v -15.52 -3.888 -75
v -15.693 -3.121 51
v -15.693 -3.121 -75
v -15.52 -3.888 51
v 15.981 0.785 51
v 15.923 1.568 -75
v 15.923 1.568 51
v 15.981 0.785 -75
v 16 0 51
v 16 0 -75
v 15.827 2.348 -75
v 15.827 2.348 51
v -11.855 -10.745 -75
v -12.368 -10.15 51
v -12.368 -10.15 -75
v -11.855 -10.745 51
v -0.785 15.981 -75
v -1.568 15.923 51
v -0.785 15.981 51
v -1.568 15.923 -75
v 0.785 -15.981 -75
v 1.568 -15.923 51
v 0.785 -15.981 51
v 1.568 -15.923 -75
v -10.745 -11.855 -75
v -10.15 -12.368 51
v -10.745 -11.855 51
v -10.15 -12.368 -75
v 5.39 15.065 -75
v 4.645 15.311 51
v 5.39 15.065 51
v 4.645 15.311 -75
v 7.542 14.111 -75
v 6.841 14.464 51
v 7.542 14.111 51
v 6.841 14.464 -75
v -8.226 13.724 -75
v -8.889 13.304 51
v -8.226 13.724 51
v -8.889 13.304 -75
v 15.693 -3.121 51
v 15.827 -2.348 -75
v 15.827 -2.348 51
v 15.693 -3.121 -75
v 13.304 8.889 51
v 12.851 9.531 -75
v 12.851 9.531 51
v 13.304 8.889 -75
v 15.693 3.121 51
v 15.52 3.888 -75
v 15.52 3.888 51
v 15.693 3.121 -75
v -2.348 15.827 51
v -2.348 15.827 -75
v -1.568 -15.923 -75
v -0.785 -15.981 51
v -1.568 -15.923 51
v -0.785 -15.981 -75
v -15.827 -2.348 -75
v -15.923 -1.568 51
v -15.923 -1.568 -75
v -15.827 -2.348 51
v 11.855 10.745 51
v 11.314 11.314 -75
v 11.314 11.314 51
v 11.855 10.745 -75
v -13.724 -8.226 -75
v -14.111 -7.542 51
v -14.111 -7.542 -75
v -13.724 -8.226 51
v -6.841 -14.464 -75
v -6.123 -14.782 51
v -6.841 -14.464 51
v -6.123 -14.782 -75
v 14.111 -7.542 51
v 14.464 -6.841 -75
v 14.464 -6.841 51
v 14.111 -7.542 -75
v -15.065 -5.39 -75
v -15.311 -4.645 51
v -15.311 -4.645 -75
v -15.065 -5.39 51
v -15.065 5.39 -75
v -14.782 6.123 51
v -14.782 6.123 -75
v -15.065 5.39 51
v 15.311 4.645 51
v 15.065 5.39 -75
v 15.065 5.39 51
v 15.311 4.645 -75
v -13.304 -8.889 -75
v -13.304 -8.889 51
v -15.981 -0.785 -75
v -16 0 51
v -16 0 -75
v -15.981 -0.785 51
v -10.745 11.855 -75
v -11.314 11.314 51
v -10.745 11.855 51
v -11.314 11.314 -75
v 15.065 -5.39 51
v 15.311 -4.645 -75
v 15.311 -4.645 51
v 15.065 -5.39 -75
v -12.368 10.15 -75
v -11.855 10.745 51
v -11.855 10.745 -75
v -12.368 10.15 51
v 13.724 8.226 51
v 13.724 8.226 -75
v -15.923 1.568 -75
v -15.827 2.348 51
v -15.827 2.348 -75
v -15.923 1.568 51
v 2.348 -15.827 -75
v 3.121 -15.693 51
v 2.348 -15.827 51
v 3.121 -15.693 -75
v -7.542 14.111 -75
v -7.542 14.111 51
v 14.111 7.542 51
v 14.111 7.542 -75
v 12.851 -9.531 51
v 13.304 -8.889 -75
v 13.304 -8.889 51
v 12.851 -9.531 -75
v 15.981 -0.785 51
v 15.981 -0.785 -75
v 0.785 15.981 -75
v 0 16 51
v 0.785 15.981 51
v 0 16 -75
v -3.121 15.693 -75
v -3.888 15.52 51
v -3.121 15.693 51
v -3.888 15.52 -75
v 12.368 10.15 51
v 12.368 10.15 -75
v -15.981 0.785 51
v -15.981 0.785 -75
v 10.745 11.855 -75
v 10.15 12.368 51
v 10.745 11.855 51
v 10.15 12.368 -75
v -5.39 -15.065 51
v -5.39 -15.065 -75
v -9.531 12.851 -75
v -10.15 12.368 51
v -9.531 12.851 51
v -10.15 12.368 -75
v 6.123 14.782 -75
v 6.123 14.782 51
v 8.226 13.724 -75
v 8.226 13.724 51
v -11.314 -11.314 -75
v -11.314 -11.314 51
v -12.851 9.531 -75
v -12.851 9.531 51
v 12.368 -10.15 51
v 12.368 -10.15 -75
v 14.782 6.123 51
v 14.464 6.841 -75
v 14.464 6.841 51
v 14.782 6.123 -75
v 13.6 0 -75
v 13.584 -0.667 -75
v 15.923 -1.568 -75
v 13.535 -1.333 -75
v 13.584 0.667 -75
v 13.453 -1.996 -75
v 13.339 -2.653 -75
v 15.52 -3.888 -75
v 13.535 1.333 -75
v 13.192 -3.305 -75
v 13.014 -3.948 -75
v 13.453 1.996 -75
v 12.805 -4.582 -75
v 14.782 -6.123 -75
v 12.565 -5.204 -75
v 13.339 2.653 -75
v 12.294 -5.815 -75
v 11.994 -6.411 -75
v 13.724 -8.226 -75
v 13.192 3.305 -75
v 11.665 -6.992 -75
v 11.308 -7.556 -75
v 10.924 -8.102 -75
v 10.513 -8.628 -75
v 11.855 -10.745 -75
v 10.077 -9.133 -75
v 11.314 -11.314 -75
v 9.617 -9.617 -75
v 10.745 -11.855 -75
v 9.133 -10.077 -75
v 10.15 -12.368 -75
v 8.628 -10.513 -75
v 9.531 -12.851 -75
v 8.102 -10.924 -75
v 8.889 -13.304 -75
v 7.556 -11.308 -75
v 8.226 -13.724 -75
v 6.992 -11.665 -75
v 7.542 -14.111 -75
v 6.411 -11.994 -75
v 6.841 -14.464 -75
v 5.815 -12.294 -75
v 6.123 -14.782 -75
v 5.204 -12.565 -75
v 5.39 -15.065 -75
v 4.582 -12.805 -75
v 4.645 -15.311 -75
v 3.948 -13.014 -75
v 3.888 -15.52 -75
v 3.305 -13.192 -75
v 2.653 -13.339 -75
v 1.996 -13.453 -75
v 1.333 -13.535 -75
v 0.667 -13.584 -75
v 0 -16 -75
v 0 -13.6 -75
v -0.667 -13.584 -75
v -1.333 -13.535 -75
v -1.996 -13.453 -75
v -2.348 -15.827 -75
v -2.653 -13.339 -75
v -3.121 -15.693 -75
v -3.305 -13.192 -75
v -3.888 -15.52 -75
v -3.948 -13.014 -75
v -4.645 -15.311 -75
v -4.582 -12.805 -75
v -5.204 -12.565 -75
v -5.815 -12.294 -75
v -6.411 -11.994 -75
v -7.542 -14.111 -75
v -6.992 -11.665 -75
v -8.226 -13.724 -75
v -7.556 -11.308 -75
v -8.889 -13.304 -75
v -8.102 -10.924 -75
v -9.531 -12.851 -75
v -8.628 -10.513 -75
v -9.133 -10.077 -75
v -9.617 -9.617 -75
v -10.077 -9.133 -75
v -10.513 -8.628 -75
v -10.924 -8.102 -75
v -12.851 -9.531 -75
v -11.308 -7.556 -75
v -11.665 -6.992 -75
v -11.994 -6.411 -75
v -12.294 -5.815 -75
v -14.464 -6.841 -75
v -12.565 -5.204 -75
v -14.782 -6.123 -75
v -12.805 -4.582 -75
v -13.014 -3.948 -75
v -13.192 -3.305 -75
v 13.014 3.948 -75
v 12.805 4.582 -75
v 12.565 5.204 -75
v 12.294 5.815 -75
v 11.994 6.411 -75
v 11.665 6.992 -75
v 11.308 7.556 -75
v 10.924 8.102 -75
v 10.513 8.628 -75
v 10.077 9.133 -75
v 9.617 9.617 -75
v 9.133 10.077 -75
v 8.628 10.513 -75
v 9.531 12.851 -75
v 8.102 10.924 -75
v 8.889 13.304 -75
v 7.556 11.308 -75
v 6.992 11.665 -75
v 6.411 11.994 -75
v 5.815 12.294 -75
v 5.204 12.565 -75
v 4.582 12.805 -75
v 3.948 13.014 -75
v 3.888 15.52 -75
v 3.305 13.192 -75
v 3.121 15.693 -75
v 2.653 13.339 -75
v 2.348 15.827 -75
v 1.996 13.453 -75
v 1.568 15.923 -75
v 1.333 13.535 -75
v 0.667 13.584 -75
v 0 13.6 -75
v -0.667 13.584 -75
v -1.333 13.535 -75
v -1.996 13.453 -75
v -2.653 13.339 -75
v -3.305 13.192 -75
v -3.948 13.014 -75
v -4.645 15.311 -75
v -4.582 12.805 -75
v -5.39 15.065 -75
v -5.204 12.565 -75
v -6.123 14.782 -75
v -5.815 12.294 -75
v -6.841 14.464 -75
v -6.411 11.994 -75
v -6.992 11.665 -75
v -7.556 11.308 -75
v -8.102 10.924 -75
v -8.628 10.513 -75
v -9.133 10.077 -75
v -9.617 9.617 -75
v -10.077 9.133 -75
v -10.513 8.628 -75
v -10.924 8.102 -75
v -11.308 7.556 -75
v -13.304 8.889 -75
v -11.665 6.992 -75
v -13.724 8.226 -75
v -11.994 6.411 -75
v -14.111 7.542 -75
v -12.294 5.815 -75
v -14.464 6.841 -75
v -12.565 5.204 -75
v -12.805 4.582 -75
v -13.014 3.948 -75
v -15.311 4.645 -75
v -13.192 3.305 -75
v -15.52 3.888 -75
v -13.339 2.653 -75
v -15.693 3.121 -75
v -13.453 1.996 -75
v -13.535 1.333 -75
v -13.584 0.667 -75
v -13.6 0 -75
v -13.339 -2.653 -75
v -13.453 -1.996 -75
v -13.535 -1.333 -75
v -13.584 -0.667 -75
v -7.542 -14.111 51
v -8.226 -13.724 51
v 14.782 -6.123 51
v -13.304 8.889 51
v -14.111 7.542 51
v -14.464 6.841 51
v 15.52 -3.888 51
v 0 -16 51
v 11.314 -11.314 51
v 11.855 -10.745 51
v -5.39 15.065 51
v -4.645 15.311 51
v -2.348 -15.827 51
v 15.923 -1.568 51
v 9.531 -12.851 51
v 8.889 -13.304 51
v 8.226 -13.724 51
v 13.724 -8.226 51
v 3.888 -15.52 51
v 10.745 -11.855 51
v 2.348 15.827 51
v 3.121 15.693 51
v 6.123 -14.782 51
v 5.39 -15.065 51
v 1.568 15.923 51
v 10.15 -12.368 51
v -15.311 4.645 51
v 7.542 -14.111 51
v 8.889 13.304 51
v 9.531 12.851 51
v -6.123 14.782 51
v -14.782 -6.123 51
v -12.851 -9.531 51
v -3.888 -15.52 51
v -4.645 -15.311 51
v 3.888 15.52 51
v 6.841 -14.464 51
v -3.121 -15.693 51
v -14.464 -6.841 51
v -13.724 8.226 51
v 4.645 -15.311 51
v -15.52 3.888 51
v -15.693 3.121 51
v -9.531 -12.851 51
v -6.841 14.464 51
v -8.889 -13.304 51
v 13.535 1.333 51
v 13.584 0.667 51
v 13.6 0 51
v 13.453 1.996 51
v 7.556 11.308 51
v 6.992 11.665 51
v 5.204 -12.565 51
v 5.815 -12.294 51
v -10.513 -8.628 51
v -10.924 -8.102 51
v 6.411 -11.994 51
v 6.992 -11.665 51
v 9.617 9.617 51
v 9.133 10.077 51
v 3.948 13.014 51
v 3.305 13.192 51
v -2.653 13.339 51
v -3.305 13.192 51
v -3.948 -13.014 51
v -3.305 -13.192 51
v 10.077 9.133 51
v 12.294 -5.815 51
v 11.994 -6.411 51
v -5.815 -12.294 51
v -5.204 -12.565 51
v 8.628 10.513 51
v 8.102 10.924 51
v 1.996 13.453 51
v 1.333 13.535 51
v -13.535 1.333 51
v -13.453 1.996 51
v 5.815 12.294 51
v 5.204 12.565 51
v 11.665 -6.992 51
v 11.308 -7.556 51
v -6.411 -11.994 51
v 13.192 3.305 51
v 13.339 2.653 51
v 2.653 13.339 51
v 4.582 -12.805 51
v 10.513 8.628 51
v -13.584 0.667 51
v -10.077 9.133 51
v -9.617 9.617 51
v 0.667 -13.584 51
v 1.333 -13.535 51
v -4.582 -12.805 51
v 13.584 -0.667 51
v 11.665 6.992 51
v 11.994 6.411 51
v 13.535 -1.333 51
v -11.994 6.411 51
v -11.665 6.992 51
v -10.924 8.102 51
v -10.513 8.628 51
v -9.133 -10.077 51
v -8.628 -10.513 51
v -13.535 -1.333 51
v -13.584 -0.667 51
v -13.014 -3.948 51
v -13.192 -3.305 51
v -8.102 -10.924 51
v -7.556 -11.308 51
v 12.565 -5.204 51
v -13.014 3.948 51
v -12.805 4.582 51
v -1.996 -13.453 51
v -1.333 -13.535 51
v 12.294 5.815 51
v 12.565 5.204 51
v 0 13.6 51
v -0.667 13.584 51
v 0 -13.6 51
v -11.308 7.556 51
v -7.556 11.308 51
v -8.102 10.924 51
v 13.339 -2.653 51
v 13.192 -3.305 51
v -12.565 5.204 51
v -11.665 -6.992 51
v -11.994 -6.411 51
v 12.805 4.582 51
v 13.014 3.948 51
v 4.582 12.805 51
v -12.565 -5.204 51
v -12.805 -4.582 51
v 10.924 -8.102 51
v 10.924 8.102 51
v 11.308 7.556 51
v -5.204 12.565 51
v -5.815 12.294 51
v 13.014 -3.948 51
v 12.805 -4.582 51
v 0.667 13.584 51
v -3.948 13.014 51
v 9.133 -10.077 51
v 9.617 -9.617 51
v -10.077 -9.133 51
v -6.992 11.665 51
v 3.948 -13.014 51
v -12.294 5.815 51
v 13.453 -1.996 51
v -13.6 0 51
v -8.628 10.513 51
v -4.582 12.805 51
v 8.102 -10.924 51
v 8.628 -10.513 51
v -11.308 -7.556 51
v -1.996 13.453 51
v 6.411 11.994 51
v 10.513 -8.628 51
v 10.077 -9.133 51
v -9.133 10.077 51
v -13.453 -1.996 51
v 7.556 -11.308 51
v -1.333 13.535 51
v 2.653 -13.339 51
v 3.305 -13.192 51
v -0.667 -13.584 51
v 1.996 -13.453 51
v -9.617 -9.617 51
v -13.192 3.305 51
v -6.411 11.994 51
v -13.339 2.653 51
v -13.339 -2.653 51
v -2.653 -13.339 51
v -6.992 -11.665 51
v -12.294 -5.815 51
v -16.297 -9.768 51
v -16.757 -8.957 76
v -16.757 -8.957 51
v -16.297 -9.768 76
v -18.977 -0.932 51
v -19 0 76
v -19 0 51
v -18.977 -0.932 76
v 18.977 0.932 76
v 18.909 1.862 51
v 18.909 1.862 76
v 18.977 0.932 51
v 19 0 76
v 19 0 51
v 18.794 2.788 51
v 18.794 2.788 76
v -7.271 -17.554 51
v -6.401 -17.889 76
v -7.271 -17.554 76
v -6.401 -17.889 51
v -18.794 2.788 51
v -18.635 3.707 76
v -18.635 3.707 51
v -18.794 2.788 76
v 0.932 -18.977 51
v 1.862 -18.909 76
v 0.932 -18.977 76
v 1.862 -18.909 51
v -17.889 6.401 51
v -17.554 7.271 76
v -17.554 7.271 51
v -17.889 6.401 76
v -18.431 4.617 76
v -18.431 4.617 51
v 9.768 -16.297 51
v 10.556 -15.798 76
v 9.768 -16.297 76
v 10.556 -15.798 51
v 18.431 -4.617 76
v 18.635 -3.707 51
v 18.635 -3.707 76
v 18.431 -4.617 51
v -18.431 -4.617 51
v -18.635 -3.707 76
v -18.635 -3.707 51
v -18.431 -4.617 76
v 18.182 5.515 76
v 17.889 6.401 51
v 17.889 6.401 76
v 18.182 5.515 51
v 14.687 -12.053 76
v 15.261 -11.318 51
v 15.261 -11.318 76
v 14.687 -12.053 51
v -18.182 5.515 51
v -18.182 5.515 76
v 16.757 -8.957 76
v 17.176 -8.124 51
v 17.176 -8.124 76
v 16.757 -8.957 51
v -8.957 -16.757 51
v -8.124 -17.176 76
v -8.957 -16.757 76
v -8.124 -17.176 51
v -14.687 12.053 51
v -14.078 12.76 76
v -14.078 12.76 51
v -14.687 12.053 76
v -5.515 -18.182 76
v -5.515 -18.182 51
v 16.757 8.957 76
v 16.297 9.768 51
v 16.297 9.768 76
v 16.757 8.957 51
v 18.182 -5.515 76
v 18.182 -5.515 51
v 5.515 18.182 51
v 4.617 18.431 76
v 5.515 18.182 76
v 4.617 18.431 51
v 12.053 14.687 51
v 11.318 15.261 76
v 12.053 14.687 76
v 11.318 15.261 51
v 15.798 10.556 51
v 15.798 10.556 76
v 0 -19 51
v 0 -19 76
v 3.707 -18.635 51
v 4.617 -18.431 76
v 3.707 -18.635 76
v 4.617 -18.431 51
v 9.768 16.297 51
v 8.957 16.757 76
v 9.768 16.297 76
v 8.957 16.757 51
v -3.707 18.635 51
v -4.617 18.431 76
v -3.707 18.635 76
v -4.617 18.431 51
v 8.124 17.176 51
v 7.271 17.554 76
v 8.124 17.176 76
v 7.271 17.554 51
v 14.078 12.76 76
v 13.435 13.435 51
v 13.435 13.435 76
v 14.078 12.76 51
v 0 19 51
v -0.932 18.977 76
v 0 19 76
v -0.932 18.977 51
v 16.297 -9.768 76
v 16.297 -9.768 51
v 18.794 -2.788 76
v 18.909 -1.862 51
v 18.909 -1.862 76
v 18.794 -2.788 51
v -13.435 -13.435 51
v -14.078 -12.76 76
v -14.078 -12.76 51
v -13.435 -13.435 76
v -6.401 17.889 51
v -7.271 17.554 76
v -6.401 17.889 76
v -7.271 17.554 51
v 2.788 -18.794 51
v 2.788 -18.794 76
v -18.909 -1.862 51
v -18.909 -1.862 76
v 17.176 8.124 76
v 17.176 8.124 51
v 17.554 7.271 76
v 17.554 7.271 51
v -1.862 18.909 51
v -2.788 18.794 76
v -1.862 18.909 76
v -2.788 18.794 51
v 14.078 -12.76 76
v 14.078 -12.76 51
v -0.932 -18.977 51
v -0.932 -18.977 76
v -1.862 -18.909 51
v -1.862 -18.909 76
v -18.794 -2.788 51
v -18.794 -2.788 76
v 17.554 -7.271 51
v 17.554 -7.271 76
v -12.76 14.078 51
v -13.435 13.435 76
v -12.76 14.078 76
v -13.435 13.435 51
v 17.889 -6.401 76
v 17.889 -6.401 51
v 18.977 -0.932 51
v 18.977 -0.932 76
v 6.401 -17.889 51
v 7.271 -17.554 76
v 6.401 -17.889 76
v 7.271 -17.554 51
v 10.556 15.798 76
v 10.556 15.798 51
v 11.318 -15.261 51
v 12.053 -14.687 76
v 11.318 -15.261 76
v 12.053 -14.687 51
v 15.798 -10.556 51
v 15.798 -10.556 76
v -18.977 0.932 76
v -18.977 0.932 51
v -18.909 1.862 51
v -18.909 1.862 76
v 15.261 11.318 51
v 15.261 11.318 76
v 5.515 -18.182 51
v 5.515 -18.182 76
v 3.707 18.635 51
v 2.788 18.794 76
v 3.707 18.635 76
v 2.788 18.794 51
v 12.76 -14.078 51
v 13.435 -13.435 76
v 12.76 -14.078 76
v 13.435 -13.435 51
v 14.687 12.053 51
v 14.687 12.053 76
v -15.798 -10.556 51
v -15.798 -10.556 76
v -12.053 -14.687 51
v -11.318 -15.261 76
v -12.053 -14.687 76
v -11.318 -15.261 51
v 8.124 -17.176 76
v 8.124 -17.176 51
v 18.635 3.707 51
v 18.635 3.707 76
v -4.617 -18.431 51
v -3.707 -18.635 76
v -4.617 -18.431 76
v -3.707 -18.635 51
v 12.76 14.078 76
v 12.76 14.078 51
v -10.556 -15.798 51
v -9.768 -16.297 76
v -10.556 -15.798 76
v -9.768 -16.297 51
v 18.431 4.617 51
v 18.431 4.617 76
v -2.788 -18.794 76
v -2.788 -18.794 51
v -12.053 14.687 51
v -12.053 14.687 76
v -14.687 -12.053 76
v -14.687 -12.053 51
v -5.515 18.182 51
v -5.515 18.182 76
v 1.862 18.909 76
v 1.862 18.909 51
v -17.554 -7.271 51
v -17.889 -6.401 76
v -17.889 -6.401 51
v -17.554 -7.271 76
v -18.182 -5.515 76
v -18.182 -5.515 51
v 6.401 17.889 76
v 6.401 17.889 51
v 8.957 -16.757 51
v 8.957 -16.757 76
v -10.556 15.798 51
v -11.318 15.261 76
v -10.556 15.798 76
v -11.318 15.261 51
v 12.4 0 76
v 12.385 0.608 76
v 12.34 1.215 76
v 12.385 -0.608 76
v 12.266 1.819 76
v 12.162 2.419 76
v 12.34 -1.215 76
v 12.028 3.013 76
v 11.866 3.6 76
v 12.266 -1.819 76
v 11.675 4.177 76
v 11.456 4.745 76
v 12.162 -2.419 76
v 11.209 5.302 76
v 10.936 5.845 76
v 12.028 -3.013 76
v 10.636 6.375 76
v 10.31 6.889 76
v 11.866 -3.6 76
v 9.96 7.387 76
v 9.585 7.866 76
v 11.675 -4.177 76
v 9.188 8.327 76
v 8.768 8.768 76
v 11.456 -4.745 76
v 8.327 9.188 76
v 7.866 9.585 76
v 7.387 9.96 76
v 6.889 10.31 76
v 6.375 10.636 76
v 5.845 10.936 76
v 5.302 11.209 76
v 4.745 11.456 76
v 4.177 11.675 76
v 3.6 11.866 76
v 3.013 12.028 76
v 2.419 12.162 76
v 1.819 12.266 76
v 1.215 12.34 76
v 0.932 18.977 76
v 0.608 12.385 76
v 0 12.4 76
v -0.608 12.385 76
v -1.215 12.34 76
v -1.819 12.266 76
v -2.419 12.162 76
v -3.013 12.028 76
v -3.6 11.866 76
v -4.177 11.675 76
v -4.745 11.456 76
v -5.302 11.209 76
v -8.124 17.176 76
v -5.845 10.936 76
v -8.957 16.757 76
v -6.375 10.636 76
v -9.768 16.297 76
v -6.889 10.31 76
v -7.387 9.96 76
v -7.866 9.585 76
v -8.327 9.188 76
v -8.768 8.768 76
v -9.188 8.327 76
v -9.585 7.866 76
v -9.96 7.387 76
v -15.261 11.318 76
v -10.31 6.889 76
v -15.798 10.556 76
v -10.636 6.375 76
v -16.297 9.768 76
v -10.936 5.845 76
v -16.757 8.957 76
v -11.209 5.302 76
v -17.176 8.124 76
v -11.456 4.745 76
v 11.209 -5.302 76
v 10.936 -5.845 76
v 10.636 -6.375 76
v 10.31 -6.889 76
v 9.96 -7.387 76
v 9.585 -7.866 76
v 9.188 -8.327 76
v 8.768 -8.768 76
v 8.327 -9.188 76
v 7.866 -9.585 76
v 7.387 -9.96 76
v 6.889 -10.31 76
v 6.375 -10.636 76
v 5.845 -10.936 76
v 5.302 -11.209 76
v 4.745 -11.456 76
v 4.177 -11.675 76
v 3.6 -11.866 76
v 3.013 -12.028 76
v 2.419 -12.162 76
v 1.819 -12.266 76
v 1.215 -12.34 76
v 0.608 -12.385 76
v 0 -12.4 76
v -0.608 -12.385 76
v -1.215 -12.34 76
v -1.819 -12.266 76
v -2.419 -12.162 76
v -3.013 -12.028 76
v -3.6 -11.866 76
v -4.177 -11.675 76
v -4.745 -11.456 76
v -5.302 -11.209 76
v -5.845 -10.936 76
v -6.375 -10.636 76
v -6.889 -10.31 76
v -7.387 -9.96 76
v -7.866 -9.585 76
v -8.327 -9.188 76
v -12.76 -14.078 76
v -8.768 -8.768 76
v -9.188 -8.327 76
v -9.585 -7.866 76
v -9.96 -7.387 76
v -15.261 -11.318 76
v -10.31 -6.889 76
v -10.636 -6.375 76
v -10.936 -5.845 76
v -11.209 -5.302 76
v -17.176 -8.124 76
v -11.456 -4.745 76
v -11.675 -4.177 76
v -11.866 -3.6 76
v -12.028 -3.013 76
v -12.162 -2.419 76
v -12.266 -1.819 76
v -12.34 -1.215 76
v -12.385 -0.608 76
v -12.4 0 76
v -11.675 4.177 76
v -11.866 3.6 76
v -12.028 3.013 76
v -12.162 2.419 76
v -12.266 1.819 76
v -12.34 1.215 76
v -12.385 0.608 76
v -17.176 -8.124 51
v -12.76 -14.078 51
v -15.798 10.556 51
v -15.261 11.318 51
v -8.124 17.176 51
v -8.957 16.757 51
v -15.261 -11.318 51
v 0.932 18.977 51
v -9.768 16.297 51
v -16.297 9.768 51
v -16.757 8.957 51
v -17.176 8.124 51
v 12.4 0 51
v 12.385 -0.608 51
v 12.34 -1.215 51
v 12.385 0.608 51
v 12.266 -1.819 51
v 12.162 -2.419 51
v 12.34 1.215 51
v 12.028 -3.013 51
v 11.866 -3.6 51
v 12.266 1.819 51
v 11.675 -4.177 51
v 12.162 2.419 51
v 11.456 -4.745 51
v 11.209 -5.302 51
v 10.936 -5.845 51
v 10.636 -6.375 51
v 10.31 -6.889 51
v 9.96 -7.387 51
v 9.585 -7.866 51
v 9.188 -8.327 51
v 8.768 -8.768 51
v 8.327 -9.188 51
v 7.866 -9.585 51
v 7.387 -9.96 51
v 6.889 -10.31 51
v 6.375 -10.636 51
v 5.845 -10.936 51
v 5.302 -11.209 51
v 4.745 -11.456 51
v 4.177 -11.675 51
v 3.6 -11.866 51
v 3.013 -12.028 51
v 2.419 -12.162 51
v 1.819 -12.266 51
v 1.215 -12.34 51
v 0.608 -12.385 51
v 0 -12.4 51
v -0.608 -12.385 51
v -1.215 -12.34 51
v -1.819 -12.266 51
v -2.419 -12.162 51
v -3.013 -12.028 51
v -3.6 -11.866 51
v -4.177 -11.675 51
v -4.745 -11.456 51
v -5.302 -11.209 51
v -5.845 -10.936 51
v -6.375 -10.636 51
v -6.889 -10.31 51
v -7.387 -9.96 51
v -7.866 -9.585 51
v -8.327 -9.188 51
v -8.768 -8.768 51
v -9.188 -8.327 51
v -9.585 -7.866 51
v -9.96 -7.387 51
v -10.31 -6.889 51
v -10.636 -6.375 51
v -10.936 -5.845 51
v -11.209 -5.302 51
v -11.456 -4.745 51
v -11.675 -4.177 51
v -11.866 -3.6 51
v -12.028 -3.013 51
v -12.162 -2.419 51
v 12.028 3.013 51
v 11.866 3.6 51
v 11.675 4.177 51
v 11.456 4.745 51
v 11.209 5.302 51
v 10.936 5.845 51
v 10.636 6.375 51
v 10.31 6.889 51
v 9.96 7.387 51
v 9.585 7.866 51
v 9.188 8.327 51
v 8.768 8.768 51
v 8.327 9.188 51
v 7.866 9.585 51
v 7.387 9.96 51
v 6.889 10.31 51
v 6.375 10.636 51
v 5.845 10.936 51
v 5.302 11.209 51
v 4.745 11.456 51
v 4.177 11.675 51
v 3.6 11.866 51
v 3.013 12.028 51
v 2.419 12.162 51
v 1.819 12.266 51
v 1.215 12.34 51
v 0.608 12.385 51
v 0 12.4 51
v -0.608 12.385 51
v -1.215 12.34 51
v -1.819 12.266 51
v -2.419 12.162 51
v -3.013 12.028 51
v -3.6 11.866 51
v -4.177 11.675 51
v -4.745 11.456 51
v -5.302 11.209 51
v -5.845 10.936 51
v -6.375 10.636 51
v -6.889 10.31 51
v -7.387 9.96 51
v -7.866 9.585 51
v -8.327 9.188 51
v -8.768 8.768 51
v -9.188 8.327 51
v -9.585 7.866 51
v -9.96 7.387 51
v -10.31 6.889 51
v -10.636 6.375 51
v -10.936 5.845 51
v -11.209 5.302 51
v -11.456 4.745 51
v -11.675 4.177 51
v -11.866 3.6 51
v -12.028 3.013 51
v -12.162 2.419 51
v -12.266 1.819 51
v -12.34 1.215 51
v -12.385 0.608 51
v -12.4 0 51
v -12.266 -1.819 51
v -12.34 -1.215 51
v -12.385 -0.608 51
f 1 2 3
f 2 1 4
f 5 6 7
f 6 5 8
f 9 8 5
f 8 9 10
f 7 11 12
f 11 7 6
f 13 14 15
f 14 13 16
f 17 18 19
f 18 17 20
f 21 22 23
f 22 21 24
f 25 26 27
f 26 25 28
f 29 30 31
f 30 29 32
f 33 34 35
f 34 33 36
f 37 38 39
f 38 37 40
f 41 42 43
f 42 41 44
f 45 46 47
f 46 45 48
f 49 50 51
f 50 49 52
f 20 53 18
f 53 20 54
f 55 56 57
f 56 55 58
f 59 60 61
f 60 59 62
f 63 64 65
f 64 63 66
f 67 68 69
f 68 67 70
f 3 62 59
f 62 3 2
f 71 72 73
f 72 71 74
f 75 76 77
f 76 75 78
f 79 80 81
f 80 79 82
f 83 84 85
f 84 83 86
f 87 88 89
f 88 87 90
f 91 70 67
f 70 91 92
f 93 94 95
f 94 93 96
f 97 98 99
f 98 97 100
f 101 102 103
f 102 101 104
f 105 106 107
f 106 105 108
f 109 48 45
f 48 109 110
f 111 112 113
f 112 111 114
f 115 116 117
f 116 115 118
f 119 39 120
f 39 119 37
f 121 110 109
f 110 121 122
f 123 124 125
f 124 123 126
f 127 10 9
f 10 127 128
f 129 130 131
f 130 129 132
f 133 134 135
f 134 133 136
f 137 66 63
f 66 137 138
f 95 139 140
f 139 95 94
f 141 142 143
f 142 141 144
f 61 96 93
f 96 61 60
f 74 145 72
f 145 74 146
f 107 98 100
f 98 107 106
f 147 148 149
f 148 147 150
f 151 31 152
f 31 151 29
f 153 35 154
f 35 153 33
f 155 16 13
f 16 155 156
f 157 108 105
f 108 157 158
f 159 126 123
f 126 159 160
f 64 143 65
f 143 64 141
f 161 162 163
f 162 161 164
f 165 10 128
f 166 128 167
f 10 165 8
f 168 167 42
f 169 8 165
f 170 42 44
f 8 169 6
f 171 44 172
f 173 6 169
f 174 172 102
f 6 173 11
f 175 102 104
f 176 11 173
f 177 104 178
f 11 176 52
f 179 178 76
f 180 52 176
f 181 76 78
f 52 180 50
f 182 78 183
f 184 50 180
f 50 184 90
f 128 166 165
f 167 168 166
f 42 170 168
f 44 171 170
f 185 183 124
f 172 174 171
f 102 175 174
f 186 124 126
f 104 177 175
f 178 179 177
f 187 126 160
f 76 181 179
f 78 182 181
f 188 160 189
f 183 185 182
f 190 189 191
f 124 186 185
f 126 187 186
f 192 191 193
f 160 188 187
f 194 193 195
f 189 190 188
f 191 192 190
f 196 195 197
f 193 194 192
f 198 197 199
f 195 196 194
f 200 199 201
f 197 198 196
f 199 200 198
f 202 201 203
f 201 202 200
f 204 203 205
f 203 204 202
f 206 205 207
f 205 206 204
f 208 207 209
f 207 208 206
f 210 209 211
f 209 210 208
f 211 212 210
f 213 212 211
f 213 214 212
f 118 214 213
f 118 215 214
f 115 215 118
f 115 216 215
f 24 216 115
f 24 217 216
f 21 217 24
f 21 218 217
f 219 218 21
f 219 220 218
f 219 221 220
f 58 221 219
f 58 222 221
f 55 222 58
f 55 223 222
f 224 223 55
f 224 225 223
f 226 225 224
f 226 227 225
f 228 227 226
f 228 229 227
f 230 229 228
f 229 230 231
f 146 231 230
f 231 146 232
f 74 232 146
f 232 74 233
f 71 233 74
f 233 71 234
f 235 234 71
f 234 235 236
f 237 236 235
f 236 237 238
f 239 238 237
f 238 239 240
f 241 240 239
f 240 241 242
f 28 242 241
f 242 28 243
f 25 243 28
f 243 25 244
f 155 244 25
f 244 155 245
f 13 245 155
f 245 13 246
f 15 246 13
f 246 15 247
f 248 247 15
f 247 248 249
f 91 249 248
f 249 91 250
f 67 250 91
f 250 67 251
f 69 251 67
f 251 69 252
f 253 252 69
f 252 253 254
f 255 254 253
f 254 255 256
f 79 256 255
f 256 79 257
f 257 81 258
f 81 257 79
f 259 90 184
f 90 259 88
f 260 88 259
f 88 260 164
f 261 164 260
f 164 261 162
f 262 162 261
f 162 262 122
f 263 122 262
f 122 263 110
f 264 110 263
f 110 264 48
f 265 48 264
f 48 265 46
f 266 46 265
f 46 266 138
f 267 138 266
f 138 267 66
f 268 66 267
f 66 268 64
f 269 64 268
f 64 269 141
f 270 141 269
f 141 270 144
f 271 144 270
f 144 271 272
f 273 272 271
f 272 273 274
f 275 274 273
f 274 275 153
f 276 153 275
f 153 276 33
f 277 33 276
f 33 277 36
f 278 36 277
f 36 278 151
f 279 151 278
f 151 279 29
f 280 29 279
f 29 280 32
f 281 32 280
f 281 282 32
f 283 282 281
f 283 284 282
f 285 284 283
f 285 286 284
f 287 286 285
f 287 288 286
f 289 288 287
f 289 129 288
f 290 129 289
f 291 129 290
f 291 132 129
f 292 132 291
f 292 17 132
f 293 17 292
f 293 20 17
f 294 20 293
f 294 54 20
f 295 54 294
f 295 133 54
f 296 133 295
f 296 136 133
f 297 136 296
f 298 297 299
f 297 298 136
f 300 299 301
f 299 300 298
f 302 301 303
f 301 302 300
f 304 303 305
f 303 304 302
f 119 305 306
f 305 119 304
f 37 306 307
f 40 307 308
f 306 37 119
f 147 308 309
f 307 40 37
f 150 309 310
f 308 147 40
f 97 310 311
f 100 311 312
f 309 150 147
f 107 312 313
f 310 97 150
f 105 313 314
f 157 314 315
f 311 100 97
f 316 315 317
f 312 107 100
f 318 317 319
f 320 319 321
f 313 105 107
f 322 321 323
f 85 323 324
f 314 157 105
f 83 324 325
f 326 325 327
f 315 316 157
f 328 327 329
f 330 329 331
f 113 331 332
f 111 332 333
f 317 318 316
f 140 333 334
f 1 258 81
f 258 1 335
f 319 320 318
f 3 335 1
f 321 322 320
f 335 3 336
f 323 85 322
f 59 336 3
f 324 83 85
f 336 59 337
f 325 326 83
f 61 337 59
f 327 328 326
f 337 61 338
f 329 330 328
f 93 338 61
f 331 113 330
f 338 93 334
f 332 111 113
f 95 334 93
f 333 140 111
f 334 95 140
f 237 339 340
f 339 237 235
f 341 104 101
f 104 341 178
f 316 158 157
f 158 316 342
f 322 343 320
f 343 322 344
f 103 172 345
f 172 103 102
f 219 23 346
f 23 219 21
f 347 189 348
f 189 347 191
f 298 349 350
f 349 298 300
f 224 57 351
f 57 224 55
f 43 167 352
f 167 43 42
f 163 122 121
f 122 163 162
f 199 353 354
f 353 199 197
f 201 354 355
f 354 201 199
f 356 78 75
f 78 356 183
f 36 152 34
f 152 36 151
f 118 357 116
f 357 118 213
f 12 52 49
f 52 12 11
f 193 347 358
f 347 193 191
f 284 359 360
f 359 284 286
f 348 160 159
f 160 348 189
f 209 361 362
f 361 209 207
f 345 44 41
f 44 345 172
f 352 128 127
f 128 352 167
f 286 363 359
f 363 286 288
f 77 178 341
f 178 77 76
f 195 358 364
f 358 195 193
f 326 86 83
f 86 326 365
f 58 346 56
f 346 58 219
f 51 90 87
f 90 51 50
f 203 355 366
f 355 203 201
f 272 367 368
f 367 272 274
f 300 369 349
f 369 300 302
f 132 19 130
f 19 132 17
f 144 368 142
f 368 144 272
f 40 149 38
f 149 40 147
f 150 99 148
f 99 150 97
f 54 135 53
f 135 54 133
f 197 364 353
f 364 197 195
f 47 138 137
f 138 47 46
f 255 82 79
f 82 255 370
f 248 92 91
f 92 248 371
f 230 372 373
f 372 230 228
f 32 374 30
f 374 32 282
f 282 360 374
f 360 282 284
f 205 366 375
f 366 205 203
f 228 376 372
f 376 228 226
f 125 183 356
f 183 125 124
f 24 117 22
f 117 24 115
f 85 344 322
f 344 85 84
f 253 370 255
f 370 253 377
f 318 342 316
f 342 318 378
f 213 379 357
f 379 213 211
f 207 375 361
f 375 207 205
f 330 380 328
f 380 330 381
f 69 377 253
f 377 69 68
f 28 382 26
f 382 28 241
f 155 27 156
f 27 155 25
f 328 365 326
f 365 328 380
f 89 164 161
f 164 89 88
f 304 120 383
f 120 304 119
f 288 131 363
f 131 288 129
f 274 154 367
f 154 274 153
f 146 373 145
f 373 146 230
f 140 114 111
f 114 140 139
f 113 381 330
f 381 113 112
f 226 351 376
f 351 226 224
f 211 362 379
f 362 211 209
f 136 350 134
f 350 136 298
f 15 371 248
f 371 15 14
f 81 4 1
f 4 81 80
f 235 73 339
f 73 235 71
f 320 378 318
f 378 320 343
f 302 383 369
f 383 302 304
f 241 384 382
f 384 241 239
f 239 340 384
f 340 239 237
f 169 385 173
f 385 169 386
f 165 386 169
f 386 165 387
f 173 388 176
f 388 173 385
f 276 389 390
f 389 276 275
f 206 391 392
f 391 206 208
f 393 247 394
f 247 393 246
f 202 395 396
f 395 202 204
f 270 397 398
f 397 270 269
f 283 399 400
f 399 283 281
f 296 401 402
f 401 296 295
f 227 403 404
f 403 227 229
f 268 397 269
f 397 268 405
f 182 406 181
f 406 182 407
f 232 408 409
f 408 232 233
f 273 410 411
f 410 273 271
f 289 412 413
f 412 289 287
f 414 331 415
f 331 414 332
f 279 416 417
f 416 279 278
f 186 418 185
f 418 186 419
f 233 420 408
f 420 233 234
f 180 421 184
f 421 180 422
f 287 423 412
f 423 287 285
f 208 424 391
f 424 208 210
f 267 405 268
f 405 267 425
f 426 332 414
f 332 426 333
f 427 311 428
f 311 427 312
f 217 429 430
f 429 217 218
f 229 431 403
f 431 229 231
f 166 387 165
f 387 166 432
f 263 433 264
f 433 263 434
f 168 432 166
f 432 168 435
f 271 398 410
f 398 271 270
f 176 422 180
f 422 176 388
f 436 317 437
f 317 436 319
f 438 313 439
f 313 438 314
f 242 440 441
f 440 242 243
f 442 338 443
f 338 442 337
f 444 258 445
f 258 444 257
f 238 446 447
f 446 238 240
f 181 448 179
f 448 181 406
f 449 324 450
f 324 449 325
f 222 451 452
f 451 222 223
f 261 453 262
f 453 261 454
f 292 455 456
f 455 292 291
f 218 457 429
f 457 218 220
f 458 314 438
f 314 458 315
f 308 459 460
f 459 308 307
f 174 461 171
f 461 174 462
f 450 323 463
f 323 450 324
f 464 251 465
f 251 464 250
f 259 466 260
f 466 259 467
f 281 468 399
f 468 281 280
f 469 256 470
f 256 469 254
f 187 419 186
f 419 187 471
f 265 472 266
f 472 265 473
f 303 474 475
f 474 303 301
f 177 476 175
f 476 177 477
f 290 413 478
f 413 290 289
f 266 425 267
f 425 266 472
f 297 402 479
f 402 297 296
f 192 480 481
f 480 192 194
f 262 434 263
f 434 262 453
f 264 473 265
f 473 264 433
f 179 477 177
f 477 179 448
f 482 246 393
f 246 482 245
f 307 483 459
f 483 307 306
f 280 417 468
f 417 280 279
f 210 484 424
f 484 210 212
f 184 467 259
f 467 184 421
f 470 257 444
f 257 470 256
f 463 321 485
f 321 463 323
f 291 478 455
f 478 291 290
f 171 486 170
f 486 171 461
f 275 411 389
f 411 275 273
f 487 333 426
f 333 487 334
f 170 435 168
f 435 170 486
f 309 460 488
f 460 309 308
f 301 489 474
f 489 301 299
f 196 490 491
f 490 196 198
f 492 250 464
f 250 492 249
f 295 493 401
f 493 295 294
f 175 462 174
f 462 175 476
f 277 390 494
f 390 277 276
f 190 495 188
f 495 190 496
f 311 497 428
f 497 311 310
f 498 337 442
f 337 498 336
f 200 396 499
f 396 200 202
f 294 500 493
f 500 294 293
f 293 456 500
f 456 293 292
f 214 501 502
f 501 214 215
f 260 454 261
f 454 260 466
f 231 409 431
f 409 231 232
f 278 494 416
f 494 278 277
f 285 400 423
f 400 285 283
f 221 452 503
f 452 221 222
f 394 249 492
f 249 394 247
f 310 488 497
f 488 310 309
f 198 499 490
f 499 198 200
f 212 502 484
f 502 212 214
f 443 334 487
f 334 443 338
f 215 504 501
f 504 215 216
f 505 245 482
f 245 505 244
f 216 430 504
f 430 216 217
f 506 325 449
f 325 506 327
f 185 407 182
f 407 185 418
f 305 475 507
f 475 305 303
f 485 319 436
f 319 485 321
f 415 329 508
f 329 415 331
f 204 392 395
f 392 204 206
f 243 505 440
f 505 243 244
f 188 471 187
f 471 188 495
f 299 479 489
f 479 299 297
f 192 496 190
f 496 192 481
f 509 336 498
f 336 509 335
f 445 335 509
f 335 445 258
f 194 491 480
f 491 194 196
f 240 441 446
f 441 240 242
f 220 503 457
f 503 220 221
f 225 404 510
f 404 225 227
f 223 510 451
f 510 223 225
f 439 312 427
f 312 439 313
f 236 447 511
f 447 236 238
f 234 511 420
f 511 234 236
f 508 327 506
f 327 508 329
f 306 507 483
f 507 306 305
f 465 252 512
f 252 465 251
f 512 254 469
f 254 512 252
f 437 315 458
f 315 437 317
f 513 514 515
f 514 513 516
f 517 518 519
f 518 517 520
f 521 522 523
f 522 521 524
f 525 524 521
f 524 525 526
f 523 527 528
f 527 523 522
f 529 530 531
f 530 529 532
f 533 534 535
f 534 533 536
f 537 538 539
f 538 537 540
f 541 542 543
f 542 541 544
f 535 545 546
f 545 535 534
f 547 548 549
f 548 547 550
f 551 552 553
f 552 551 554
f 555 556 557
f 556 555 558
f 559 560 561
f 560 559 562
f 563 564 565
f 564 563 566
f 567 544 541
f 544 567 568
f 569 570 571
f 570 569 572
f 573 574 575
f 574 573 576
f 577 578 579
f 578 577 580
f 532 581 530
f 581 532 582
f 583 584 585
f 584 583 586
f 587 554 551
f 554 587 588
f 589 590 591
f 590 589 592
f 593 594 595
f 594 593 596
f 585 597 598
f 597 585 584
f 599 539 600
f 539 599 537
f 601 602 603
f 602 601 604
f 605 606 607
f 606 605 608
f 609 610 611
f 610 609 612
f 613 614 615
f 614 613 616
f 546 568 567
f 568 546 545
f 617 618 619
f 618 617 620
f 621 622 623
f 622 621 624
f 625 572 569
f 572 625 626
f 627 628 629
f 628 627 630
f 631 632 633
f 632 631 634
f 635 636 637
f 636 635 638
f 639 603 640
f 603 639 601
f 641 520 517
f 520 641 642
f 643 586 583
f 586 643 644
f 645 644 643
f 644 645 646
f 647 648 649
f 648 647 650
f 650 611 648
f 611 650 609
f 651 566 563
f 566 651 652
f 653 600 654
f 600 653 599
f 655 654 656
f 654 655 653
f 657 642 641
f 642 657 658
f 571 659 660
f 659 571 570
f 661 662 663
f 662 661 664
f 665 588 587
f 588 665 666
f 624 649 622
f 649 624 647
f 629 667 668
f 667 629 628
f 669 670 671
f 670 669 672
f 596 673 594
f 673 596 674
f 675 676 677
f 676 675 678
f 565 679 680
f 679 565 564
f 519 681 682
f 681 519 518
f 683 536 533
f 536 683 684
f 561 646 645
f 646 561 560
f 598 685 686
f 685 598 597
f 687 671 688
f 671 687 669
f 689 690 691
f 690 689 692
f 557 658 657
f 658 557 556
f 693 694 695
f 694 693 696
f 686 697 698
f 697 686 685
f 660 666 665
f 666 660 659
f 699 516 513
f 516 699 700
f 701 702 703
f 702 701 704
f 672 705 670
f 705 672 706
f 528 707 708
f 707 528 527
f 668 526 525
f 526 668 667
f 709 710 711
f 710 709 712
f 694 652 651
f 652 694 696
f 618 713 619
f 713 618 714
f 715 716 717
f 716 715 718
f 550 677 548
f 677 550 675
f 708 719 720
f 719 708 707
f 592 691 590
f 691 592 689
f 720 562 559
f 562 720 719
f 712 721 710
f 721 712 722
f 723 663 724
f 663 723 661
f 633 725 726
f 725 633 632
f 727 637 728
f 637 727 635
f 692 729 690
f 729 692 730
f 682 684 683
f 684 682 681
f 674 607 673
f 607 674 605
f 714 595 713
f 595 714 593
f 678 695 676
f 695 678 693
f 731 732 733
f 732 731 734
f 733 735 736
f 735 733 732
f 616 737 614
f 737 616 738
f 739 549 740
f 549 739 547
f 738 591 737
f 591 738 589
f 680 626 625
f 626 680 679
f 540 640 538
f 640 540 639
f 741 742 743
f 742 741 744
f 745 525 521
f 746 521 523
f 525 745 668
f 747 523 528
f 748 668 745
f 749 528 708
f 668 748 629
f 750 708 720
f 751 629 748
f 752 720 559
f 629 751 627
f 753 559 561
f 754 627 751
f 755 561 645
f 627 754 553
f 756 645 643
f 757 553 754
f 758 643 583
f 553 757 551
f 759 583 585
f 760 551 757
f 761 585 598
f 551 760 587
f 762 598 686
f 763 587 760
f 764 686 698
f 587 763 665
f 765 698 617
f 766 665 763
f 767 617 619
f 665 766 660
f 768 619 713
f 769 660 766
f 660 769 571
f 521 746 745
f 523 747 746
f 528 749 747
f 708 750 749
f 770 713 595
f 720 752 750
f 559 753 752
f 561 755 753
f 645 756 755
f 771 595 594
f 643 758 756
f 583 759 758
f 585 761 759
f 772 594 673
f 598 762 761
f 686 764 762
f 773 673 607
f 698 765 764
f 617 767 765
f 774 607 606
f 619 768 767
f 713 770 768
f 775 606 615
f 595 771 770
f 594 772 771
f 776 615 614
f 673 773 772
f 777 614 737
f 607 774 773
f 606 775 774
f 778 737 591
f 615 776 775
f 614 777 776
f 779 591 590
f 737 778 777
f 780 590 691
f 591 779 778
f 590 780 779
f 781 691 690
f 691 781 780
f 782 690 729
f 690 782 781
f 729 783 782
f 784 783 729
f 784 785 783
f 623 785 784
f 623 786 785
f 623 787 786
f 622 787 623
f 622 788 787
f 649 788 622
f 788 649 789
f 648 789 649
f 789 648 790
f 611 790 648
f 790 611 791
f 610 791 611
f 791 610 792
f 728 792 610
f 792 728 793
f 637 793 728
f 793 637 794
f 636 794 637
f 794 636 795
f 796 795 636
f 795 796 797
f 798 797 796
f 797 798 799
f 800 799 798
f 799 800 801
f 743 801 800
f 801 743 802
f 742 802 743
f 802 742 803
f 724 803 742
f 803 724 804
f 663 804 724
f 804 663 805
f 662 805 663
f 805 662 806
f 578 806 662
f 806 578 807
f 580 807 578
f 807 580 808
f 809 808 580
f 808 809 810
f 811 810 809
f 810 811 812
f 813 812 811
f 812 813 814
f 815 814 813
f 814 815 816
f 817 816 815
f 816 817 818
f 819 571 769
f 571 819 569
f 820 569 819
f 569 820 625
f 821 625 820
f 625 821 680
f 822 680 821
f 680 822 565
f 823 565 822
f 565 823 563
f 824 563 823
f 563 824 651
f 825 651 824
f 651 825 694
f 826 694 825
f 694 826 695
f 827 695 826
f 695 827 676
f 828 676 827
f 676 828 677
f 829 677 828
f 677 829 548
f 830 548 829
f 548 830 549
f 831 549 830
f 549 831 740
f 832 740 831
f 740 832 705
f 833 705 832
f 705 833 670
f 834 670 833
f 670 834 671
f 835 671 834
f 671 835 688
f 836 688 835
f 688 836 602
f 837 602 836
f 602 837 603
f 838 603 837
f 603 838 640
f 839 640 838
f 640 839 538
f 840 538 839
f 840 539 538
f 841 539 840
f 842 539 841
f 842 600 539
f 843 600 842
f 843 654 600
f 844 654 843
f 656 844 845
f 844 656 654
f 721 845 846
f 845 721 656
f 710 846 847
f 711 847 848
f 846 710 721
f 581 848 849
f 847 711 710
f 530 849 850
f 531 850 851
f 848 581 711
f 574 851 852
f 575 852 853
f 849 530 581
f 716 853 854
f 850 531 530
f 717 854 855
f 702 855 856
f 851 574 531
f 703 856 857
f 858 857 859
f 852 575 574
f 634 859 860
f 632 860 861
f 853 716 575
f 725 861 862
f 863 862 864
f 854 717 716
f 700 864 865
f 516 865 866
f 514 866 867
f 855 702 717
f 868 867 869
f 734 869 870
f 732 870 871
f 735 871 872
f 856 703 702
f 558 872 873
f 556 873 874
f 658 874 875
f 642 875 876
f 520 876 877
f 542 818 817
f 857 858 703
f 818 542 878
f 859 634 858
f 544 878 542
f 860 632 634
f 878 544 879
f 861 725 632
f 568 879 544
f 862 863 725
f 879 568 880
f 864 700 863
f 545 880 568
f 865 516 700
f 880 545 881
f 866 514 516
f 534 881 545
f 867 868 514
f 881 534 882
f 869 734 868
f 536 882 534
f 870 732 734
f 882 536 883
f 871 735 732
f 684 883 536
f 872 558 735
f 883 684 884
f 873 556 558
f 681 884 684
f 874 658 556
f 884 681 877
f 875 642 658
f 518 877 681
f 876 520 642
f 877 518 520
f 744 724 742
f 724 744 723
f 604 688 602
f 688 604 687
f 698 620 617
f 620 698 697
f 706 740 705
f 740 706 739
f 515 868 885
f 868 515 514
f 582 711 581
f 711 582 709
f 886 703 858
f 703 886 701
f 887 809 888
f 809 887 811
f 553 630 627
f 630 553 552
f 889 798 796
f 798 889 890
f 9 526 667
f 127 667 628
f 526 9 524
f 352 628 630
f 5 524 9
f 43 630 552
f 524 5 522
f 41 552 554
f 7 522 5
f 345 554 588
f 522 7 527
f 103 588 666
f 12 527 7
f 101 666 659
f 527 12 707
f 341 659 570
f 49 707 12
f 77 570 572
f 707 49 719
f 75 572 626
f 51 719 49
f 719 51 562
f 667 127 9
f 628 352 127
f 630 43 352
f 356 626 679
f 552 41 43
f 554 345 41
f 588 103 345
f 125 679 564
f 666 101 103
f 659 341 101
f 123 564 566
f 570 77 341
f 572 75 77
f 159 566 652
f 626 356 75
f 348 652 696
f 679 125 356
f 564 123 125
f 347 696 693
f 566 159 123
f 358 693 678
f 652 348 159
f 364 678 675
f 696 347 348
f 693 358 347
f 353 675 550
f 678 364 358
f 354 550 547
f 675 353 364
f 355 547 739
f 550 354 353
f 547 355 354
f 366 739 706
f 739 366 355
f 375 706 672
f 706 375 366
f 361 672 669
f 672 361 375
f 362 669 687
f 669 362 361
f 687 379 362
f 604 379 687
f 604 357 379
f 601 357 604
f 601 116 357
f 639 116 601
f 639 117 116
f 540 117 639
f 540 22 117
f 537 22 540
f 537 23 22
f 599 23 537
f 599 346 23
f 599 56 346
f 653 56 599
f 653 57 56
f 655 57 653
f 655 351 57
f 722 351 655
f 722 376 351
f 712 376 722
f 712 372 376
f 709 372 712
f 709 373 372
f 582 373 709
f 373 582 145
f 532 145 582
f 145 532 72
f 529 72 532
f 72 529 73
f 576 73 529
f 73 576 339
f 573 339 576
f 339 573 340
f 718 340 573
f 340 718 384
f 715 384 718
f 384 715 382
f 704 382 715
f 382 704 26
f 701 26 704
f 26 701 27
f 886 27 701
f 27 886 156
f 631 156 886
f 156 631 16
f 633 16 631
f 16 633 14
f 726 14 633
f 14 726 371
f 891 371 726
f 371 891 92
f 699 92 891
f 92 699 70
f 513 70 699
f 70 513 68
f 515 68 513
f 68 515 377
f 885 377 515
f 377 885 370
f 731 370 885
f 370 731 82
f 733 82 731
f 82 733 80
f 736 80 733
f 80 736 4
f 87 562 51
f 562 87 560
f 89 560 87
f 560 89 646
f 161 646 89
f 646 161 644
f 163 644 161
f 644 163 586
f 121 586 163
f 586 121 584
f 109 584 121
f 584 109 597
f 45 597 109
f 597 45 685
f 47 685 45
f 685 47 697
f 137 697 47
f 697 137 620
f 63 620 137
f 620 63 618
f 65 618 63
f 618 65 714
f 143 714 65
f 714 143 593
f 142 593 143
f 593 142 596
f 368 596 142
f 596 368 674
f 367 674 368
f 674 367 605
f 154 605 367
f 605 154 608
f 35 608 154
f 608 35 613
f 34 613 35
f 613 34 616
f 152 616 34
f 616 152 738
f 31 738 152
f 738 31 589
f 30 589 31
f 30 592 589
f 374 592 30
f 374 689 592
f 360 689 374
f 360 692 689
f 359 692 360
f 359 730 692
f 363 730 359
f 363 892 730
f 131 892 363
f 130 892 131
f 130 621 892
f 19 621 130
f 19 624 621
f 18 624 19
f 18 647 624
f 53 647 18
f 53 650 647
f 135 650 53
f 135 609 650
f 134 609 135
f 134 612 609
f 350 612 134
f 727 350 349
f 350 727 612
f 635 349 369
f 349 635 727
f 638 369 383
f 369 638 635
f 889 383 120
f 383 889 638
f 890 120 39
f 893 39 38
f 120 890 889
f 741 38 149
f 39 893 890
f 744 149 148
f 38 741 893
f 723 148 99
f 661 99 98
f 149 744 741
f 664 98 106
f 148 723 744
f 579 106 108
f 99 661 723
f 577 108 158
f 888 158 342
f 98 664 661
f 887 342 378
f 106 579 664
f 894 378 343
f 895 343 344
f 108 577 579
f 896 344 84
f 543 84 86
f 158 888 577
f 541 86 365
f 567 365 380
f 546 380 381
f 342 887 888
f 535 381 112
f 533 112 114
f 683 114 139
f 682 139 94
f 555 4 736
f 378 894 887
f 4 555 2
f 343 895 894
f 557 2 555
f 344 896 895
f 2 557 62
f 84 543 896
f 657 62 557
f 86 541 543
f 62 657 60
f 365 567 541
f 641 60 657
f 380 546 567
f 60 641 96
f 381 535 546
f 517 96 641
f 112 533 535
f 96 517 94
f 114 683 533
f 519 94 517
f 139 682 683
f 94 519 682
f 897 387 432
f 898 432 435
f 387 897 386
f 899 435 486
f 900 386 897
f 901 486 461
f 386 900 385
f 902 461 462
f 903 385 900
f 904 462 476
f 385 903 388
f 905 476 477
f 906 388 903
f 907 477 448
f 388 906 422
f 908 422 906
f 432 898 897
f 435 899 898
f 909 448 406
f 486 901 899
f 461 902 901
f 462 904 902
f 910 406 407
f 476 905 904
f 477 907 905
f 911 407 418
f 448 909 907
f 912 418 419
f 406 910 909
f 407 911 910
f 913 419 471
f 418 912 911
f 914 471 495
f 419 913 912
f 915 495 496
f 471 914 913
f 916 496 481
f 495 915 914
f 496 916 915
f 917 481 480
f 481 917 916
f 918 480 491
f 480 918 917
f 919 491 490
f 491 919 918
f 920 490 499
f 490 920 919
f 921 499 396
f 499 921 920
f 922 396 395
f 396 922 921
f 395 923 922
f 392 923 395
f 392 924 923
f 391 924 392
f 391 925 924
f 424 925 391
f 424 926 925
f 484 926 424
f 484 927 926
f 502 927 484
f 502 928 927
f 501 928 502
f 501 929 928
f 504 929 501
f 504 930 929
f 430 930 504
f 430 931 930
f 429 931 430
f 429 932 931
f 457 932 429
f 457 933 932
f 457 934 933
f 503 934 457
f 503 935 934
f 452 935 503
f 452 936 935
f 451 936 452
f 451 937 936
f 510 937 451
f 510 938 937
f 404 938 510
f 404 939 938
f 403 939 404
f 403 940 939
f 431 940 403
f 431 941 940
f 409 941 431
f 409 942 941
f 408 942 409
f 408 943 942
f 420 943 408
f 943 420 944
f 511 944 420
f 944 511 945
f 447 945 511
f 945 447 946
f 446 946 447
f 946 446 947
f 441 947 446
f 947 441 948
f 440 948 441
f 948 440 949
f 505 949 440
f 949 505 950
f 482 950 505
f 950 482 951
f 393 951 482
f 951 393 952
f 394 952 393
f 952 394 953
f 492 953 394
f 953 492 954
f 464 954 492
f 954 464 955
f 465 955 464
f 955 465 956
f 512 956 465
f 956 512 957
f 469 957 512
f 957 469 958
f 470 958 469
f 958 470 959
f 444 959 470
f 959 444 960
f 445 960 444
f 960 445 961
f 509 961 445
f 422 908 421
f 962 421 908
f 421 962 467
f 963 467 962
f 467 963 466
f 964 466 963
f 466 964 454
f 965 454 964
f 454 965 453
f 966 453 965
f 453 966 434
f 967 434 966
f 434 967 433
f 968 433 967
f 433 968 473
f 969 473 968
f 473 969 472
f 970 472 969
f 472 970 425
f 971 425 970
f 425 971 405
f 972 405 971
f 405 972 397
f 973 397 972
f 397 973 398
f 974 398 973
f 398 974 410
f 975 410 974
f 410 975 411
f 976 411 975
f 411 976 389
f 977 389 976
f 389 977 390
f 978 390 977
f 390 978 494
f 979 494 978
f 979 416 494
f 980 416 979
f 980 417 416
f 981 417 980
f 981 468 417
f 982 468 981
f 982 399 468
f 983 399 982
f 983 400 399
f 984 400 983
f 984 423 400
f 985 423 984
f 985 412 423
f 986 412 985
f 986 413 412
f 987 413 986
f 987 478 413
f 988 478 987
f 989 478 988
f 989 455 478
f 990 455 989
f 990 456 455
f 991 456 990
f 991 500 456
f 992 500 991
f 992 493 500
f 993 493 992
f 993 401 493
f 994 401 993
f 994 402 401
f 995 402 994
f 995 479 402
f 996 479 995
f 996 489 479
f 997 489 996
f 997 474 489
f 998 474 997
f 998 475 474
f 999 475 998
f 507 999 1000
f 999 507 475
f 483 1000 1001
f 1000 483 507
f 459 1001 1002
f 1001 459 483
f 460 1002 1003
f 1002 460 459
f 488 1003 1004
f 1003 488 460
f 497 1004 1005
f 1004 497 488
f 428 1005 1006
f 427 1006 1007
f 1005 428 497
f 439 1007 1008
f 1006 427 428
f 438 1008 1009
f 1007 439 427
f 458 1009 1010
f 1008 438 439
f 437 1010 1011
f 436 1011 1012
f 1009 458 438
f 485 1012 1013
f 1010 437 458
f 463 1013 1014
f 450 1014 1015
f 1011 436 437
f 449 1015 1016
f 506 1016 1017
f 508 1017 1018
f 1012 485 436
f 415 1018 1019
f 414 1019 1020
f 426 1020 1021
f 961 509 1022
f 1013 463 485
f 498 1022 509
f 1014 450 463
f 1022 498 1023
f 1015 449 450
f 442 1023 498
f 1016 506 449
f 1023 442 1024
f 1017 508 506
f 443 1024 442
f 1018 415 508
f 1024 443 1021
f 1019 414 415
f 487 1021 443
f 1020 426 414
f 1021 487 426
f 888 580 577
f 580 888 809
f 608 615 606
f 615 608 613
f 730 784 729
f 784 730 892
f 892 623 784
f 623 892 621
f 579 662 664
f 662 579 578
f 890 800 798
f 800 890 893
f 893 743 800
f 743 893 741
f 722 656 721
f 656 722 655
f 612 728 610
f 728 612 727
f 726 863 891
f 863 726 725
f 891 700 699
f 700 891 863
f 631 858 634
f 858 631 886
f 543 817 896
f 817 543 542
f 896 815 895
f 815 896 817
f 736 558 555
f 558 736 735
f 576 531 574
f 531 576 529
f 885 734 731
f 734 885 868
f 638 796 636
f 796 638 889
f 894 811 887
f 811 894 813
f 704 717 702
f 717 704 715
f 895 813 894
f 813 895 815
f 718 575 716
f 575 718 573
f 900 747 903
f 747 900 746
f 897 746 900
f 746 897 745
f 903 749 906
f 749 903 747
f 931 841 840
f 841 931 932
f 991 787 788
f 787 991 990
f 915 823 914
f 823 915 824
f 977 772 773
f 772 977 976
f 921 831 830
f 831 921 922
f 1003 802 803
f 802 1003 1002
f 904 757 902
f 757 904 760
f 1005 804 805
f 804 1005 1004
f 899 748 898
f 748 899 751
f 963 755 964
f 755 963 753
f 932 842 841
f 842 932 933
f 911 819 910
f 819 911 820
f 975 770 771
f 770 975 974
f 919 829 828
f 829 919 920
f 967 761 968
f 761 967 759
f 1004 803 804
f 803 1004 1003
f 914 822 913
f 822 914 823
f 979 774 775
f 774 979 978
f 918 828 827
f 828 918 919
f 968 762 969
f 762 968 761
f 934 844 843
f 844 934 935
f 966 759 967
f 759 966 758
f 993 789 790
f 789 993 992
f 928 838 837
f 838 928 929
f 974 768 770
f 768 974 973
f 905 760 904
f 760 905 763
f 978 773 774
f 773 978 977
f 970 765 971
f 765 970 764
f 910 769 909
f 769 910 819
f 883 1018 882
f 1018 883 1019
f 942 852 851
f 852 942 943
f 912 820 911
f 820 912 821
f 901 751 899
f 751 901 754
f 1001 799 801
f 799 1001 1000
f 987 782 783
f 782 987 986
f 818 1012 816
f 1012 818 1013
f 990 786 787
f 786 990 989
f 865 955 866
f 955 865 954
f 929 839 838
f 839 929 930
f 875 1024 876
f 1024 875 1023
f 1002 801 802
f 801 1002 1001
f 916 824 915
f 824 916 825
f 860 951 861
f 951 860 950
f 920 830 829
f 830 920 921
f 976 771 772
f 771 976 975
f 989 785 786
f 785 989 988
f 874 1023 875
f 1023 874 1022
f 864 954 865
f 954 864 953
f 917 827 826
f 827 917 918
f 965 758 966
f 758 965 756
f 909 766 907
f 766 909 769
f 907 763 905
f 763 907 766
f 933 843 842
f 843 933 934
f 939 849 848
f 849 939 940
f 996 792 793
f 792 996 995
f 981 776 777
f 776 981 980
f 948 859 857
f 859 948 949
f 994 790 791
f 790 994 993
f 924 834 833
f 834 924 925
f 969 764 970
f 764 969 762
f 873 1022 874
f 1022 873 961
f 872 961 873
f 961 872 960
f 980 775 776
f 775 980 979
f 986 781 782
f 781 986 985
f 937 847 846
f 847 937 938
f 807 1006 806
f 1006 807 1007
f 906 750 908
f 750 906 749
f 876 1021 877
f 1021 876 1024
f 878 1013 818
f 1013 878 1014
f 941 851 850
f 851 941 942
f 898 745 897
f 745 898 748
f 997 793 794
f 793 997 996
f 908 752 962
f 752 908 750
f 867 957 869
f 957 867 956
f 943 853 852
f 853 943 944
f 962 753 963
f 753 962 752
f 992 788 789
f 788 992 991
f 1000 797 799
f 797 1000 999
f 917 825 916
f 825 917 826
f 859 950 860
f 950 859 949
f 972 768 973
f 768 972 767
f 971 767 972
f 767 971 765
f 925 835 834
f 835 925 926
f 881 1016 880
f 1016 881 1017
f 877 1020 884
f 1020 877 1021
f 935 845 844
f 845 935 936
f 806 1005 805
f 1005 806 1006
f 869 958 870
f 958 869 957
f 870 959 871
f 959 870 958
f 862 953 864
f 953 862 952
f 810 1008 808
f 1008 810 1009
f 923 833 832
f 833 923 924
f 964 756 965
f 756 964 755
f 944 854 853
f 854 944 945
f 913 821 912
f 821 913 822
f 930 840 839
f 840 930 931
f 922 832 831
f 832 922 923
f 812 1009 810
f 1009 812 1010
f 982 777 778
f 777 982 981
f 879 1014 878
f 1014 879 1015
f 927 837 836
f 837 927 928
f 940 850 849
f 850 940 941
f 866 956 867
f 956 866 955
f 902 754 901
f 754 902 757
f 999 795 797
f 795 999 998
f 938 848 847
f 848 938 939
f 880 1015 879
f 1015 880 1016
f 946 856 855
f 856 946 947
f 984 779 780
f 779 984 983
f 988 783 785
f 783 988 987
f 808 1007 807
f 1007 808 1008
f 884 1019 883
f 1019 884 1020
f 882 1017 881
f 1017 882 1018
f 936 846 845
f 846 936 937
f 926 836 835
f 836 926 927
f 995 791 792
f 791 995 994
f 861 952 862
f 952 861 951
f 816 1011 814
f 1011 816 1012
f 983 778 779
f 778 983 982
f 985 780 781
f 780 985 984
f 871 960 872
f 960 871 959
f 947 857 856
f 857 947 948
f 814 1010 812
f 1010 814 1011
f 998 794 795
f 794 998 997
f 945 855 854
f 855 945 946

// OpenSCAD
// HT 32 pipe 150 mm (single connected solid)

// Parameters
pipe_standard = 1; //[1:1:1]
nominal_size_mm = 32; //[16:64:1]
length_mm = 150; //[75:300:1]
od_mm = 32; //[16:64:0.5]
wall_mm = 2.4; //[1.2:4.8:0.1]
bore_d_mm = 27.2; //[13.6:54.4:0.1]
include_end_fitting = 1; //[0:1:1]
fitting_length_mm = 25; //[12.5:50:0.5]
fitting_od_extra_mm = 6; //[3:12:0.5]
fitting_wall_extra_mm = 1.2; //[0.6:2.4:0.1]
overlap_mm = 1; //[0.5:2:0.1]

$fn = 128;

module ht_pipe() {
  // Derived radii (prefer bore_d_mm if provided; otherwise compute from wall)
  od_r = od_mm/2;
  bore_r_from_wall = max(0.01, od_r - wall_mm);
  bore_r = (bore_d_mm > 0) ? max(0.01, bore_d_mm/2) : bore_r_from_wall;

  fitting_od_r = (od_mm + fitting_od_extra_mm)/2;

  // Fitting inner radius: keep it <= main bore so the collar doesn't create an internal "step" that can
  // cause coincident/degenerate surfaces; also keep it > 0.
  fitting_bore_r_raw = bore_r - fitting_wall_extra_mm;
  fitting_bore_r = max(0.01, min(bore_r, fitting_bore_r_raw));

  // Place collar at the +Z end, overlapping into the main pipe by overlap_mm (guarantees connectivity)
  collar_center_z = (length_mm/2) - (fitting_length_mm/2) + overlap_mm;

  color([0.85, 0.85, 0.8])
  union() {
    // Main pipe (hollow)
    difference() {
      cylinder(h=length_mm, r=od_r, center=true);
      cylinder(h=length_mm + 2*overlap_mm, r=bore_r, center=true);
    }

    // End fitting collar (hollow), connected via overlap into main pipe
    if (include_end_fitting) {
      translate([0, 0, collar_center_z])
      difference() {
        cylinder(h=fitting_length_mm, r=fitting_od_r, center=true);
        cylinder(h=fitting_length_mm + 2*overlap_mm, r=fitting_bore_r, center=true);
      }
    }
  }
}

// Assembly
ht_pipe();
